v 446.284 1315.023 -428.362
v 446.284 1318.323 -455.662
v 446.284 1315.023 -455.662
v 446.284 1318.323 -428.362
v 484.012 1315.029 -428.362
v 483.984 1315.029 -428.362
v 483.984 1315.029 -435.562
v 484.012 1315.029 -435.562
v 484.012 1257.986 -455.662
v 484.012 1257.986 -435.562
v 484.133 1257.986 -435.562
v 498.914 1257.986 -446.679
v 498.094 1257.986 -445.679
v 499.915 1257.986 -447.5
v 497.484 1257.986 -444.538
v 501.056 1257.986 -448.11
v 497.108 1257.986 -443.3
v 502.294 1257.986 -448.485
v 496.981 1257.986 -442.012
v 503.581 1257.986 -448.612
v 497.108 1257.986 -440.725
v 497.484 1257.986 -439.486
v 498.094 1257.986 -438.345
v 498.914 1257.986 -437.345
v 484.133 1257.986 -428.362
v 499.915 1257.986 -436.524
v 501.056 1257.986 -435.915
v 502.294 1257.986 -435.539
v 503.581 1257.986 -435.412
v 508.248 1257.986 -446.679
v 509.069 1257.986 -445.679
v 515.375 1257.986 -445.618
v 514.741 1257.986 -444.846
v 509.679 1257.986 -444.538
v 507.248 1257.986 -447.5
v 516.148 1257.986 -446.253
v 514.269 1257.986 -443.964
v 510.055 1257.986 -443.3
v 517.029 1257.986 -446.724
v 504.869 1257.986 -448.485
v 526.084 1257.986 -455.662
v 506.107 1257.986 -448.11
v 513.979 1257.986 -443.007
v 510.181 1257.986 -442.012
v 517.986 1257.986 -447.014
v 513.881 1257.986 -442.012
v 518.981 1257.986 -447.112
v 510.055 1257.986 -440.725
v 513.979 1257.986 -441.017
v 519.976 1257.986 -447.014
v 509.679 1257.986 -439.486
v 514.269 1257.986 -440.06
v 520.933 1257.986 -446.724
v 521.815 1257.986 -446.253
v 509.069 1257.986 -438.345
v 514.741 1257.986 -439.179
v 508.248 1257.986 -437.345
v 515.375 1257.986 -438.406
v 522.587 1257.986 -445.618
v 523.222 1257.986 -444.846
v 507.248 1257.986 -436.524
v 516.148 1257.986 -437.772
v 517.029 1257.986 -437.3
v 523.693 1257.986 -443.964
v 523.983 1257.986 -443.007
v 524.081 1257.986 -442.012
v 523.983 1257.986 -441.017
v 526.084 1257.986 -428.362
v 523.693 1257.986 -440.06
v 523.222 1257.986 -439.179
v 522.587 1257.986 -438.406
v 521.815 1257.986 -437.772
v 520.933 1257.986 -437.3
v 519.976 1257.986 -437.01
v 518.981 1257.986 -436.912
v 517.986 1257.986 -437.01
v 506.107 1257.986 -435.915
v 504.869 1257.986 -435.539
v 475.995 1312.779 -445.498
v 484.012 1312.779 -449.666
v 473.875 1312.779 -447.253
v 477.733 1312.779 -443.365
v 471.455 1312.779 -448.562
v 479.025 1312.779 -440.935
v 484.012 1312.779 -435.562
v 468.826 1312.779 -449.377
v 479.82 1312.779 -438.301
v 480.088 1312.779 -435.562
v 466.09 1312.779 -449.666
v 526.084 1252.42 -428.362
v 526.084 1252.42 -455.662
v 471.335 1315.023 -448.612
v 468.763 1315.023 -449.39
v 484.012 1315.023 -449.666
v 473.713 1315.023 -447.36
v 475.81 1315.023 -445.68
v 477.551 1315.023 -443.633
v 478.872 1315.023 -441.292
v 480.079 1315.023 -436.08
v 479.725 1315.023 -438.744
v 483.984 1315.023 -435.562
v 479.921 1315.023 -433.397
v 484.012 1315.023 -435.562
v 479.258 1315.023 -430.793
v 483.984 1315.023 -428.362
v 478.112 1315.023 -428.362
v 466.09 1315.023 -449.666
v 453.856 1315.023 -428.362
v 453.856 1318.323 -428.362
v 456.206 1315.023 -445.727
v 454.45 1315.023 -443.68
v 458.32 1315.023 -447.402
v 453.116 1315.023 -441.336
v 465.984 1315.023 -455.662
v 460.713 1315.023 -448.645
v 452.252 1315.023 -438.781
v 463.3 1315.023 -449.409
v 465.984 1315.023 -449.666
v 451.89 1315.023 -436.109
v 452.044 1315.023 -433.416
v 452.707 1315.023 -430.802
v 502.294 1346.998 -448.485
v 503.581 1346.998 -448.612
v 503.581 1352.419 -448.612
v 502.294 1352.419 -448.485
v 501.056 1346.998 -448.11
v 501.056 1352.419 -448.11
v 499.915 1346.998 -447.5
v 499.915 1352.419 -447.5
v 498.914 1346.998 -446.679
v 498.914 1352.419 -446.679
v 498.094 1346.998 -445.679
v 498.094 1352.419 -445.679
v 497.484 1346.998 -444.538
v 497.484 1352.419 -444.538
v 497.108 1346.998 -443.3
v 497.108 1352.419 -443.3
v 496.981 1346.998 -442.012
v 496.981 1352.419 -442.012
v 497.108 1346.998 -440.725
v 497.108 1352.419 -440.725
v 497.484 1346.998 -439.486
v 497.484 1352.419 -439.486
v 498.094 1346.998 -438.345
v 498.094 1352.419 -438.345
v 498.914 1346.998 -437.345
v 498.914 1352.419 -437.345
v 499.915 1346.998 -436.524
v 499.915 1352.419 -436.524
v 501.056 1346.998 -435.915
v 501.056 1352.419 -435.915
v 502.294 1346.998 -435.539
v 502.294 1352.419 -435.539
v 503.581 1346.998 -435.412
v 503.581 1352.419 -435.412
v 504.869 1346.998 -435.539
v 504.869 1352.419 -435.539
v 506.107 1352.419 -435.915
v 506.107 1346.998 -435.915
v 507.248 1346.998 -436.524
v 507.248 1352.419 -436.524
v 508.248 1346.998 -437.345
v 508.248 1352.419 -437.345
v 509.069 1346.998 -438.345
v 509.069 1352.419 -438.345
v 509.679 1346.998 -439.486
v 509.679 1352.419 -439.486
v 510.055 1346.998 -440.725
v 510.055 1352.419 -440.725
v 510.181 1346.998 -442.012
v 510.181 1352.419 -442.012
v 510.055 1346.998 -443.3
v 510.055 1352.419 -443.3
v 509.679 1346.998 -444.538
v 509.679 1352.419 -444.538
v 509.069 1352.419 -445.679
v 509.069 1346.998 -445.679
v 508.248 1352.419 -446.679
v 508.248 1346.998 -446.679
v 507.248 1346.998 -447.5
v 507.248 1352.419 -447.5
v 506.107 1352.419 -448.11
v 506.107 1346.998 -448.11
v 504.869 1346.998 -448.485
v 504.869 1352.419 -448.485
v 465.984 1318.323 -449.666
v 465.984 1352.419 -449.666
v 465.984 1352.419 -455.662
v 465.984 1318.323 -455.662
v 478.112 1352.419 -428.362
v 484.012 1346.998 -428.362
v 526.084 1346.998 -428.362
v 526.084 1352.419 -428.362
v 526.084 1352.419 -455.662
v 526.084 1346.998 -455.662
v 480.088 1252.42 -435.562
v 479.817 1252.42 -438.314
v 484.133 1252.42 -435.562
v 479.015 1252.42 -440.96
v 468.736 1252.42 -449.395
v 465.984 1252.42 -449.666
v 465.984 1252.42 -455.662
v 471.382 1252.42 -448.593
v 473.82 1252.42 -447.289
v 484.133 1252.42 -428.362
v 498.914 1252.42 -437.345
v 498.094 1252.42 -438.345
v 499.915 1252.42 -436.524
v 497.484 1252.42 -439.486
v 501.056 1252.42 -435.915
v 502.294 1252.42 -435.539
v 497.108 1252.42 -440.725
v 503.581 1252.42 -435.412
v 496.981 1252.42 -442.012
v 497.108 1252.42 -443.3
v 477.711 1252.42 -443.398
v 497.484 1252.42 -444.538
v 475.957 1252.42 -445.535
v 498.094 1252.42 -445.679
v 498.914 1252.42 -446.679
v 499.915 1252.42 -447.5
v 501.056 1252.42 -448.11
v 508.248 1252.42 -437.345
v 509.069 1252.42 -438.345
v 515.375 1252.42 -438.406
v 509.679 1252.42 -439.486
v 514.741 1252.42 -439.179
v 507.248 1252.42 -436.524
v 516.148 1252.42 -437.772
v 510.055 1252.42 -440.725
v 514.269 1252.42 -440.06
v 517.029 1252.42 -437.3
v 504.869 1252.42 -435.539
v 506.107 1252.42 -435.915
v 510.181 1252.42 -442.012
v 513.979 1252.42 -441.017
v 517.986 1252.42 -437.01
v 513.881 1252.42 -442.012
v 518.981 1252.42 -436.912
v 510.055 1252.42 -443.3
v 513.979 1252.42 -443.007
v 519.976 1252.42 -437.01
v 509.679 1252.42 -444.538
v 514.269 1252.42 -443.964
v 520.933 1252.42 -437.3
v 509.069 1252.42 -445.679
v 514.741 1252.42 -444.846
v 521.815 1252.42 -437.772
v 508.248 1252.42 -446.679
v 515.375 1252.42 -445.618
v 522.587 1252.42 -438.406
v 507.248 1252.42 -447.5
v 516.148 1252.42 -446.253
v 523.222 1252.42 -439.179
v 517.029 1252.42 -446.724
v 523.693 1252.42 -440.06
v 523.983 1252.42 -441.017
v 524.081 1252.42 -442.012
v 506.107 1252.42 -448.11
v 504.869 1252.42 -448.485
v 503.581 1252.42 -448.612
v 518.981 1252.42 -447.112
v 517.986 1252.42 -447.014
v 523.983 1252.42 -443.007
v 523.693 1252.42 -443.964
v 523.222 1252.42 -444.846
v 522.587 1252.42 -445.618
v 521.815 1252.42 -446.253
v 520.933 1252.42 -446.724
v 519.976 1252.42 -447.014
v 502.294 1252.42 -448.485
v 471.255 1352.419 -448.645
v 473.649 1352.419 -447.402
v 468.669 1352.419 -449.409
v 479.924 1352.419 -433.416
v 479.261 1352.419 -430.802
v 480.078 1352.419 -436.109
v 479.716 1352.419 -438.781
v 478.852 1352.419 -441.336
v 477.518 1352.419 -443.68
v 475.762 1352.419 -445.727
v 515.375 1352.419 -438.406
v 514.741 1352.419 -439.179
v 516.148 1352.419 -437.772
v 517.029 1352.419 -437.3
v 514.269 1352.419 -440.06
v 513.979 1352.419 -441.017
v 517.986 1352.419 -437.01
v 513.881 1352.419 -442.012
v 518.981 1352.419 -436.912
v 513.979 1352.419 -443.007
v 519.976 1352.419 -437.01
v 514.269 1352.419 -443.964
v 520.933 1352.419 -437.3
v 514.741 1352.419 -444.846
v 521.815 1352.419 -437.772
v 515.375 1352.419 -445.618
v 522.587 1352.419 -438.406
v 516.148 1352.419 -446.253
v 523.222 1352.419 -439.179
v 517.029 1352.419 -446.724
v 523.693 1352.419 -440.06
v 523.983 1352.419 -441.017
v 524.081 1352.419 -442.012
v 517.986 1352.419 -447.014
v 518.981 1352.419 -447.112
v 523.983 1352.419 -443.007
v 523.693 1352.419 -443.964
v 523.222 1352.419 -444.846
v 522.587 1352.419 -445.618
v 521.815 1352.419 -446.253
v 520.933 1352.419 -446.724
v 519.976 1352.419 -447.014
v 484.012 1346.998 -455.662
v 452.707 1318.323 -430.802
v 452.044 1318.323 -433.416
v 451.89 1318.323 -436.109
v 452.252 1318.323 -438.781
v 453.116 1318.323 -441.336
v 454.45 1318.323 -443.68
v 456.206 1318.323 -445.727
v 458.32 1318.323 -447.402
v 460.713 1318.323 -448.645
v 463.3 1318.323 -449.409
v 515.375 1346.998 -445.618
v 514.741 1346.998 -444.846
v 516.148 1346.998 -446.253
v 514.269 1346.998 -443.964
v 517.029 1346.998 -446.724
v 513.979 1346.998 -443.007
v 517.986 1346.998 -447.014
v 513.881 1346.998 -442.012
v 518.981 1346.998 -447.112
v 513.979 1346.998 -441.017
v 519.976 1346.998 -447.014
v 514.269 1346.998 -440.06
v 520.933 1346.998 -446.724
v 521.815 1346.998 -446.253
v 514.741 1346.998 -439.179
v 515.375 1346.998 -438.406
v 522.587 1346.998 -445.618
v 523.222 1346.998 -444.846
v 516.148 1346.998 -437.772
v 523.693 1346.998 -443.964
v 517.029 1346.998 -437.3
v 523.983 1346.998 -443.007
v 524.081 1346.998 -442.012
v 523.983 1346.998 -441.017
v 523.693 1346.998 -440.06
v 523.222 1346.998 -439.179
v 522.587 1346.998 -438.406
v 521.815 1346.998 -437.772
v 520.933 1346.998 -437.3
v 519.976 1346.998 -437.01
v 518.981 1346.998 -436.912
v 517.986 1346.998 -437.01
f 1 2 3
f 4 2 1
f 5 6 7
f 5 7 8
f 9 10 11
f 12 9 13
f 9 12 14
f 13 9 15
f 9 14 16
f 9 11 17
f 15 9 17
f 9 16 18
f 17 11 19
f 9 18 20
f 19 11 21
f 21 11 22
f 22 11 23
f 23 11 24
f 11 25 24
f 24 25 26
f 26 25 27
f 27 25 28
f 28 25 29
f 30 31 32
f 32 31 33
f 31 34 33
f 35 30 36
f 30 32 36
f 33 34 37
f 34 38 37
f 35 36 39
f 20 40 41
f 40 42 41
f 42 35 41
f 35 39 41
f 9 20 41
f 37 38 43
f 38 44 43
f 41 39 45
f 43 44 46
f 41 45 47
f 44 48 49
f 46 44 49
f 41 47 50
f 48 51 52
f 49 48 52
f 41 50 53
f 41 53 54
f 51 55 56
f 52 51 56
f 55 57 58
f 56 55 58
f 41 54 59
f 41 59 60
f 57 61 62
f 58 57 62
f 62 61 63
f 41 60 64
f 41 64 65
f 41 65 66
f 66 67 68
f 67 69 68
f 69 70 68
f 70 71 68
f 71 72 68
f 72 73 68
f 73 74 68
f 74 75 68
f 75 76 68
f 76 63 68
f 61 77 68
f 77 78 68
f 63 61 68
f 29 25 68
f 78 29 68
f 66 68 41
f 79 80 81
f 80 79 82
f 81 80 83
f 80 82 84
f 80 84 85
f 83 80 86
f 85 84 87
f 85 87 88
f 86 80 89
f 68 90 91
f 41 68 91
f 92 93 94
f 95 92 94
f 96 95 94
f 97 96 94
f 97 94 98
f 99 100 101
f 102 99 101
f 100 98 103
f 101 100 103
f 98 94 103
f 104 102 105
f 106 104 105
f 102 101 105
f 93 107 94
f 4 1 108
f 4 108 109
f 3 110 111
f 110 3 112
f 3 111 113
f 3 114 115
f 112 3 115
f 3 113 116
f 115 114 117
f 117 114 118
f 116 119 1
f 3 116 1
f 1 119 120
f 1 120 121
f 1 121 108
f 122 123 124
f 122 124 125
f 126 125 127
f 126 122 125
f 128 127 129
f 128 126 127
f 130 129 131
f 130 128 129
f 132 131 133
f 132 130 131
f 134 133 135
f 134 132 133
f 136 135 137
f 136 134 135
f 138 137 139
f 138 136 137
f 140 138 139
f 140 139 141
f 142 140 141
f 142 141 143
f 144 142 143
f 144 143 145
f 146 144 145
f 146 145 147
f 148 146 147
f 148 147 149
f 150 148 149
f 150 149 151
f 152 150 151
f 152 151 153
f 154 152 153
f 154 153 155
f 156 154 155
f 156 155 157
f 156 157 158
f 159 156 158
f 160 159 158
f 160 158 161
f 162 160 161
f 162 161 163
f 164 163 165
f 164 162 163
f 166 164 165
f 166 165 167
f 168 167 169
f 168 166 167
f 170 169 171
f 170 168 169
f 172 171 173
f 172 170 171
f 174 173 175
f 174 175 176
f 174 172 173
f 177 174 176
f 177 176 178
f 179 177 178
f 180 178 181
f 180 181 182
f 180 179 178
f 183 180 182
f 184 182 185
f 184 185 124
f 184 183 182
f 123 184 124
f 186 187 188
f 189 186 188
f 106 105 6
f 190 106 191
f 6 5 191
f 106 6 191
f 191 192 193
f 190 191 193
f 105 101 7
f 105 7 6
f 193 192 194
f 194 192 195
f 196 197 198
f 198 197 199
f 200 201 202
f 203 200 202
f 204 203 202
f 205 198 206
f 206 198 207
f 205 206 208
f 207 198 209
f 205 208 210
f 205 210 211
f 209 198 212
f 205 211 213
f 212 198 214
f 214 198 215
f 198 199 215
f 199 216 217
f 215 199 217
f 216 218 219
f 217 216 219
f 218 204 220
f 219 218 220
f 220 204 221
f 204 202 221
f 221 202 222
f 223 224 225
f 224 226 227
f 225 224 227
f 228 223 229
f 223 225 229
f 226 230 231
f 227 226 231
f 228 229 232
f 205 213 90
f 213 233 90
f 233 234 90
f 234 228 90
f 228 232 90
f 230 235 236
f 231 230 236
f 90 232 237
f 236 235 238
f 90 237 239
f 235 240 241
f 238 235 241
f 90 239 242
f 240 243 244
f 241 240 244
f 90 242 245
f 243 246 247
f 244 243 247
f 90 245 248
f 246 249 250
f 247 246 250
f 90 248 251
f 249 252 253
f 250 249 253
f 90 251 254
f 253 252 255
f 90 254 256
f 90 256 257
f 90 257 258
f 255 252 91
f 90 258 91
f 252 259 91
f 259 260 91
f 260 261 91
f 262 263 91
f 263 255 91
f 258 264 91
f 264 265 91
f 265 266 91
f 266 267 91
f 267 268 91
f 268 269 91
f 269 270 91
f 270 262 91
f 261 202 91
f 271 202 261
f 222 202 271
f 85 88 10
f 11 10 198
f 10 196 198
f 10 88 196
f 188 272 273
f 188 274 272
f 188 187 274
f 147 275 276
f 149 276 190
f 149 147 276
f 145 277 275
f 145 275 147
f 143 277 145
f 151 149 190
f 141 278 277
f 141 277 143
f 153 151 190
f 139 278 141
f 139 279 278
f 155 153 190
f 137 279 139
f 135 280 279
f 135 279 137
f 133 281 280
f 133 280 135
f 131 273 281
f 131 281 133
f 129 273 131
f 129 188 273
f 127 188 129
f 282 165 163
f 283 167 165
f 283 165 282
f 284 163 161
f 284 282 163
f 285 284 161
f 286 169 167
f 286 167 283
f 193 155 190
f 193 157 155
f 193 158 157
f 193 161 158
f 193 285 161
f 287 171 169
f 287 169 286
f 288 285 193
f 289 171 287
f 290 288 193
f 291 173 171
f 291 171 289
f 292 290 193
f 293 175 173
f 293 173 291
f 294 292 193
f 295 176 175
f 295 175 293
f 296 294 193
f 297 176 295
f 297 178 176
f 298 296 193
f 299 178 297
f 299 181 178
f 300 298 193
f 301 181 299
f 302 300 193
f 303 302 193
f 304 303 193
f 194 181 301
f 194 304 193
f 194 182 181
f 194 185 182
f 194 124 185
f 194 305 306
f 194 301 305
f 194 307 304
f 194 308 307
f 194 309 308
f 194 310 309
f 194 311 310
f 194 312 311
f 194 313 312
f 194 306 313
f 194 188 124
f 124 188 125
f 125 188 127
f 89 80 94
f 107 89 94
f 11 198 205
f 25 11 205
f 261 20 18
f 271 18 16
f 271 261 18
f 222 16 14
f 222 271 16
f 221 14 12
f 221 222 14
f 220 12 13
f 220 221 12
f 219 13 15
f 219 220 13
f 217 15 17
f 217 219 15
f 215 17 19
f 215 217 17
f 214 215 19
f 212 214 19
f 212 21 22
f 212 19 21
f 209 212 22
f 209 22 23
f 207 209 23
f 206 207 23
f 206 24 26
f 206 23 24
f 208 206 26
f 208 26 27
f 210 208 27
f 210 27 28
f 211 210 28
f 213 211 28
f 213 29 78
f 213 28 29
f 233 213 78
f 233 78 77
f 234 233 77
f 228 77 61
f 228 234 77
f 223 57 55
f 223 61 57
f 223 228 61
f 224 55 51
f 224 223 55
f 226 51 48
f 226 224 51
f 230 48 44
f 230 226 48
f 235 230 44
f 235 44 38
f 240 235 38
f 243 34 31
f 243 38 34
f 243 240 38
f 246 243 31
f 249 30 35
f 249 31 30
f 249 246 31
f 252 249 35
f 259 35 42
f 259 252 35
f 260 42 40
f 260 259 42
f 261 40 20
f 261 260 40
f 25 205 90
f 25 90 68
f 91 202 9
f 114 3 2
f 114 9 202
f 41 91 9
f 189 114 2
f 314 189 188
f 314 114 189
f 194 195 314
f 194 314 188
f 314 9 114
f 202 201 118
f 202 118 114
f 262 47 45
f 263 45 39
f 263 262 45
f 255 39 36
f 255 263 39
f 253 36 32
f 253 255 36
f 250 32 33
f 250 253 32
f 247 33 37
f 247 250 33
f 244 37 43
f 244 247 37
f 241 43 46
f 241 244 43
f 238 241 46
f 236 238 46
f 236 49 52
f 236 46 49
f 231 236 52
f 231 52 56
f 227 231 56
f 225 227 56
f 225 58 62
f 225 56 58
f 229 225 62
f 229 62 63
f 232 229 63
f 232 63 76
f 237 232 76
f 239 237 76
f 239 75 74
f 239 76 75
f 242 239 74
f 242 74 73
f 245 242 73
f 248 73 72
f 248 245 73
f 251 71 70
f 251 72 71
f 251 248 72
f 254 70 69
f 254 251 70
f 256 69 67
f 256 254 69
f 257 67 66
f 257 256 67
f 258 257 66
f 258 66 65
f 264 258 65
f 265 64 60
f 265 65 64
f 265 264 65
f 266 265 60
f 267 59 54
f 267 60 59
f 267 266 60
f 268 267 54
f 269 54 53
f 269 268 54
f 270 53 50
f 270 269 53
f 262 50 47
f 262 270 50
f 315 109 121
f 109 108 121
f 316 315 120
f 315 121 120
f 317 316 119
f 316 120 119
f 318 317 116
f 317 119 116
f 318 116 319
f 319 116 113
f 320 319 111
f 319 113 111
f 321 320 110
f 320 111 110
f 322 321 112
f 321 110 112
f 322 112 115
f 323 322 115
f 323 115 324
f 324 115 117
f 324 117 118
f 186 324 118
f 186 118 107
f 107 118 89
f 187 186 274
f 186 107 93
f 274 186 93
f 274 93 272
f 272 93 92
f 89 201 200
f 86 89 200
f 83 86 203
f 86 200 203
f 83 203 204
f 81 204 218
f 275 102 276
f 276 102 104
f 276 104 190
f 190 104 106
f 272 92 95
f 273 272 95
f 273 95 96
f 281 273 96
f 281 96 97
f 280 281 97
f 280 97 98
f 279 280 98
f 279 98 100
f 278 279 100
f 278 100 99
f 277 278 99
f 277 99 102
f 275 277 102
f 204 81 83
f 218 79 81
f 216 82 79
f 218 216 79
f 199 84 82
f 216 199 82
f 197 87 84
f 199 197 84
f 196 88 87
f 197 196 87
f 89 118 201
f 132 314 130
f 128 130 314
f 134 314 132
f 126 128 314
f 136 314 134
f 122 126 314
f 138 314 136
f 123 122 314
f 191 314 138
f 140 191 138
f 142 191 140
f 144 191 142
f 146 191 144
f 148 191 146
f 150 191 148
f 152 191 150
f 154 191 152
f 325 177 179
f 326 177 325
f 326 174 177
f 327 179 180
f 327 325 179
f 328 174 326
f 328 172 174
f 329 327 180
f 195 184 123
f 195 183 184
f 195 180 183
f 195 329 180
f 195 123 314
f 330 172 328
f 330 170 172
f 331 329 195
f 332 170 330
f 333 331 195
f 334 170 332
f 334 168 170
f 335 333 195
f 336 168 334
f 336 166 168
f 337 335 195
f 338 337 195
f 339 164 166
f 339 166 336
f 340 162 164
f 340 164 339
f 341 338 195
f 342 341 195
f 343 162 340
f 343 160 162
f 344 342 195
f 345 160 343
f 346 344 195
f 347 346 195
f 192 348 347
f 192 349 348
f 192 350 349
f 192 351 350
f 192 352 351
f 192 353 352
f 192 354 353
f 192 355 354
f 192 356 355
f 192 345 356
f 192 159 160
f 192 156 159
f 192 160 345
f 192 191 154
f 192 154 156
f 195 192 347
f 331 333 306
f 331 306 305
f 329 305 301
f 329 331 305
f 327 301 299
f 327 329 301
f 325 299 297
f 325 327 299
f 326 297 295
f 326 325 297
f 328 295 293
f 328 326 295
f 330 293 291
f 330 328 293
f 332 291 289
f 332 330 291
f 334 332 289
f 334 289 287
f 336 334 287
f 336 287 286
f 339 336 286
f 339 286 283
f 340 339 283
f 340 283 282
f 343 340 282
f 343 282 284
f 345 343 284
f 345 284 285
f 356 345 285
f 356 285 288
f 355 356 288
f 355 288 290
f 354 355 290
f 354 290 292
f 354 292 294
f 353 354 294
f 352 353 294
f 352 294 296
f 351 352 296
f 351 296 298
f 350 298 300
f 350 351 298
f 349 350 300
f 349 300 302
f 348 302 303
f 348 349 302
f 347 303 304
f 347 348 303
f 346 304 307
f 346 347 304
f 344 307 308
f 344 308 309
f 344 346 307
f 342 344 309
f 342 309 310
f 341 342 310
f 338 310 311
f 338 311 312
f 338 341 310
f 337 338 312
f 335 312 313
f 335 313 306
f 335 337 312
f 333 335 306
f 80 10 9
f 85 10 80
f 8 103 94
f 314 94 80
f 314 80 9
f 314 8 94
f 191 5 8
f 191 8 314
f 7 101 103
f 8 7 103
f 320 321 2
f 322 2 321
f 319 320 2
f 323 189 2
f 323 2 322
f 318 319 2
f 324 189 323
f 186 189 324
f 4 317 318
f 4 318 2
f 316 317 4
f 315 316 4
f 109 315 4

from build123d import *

# Parameters (mm, degrees)
SKETCH1_W              = 1526.54
SKETCH1_H              = 693.42
SKETCH1_R              = 129.54
SKETCH1_R_2            = 167.64
BOSS_EXTRUDE1_DEPTH    = 2540
SKETCH6_W              = 1068.621988509
SKETCH6_H              = 2260.925218267
CUT_EXTRUDE1_DEPTH     = 2540
CUT_EXTRUDE2_START     = -1590.133899231
CUT_EXTRUDE2_OUTLINE_W = 457.2
CUT_EXTRUDE2_OUTLINE_H = 182.88
CUT_EXTRUDE2_DEPTH     = 1590.133899231
SKETCH21_W             = 358.24
SKETCH21_H             = 57
CUT_EXTRUDE3_DEPTH     = 572.124
SKETCH22_W             = 693.42
SKETCH22_H             = 83.82
BOSS_EXTRUDE3_DEPTH    = 500.38
CUT_EXTRUDE4_DEPTH     = 2616.2
SKETCH24_R             = 358.25
CUT_EXTRUDE5_DEPTH     = 2616.2
SKETCH25_W             = 3.793020403
SKETCH25_H             = 182.88
CUT_EXTRUDE7_DEPTH     = 1590.294
SCALE1_SCALE           = 0.03937


# Read off the part's stored shape, not the designer's step: Cut-Extrude2
with BuildPart() as part:
    # Sketch1 → Boss-Extrude1 (new body)
    with BuildSketch(Plane(origin=(0, 0, 0), x_dir=(1, 0, 0), z_dir=(0, 1, 0))):
        with Locations((763.27, 346.71)):
            Rectangle(SKETCH1_W, SKETCH1_H)
        with Locations(Location((1346.125866933, 346.71, 0), (0, 0, 90))):
            Circle(SKETCH1_R, mode=Mode.SUBTRACT)
        with Locations(Location((954.97060339, 346.71, 0), (0, 0, 90))):
            Circle(SKETCH1_R_2, mode=Mode.SUBTRACT)
    extrude(amount=BOSS_EXTRUDE1_DEPTH)

    # Sketch6 → Cut-Extrude1 (cut)
    with BuildSketch(Plane.XY):
        with Locations((992.229005746, 1271.841969381)):
            Rectangle(SKETCH6_W, SKETCH6_H)
    extrude(amount=-CUT_EXTRUDE1_DEPTH, mode=Mode.SUBTRACT)

    # Cut-Extrude2 outline → Cut-Extrude2 (cut)
    with BuildSketch(Plane.XZ.offset(CUT_EXTRUDE2_START)):
        with Locations((228.6, -91.44)):
            Rectangle(CUT_EXTRUDE2_OUTLINE_W, CUT_EXTRUDE2_OUTLINE_H)
    extrude(amount=CUT_EXTRUDE2_DEPTH, mode=Mode.SUBTRACT)

    # Sketch21 → Cut-Extrude3 (cut)
    with BuildSketch(Plane.ZY):
        with Locations((-362, 1561.633899231)):
            Rectangle(SKETCH21_W, SKETCH21_H)
    extrude(amount=-CUT_EXTRUDE3_DEPTH, mode=Mode.SUBTRACT)

    # Sketch22 → Boss-Extrude3 (add)
    with BuildSketch(Plane.ZY):
        with Locations((-346.71, 1632.043899231)):
            Rectangle(SKETCH22_W, SKETCH22_H)
    extrude(amount=BOSS_EXTRUDE3_DEPTH)

    # Sketch23 → Cut-Extrude4 (cut)
    with BuildSketch(Plane.XZ):
        with BuildLine():
            Line((343.932135816, -182.88), (358.25, -182.88))
            ThreePointArc((358.25, -182.88), (-253.32100436, 70.44100436), (0, -541.13))
            Line((0, -541.13), (0, -182.88))
            Line((0, -182.88), (343.932135816, -182.88))
        make_face()
    extrude(amount=-CUT_EXTRUDE4_DEPTH, mode=Mode.SUBTRACT)

    # Sketch24 → Cut-Extrude5 (cut)
    with BuildSketch(Plane.XZ):
        with Locations((0, -182.88)):
            Circle(SKETCH24_R)
    extrude(amount=-CUT_EXTRUDE5_DEPTH, mode=Mode.SUBTRACT)

    # Sketch25 → Cut-Extrude7 (cut)
    with BuildSketch(Plane.XZ):
        with Locations((459.096510201, -91.44)):
            Rectangle(SKETCH25_W, SKETCH25_H)
    extrude(amount=-CUT_EXTRUDE7_DEPTH, mode=Mode.SUBTRACT)


with BuildPart() as part_1:
    # Scale1: scaled about (485.081829704, 1303.748157577, -445.917993823)
    add(part.part.scale(SCALE1_SCALE).moved(Location((465.984158069, 1252.419592613, -428.362202406))))


solid = part_1.part
